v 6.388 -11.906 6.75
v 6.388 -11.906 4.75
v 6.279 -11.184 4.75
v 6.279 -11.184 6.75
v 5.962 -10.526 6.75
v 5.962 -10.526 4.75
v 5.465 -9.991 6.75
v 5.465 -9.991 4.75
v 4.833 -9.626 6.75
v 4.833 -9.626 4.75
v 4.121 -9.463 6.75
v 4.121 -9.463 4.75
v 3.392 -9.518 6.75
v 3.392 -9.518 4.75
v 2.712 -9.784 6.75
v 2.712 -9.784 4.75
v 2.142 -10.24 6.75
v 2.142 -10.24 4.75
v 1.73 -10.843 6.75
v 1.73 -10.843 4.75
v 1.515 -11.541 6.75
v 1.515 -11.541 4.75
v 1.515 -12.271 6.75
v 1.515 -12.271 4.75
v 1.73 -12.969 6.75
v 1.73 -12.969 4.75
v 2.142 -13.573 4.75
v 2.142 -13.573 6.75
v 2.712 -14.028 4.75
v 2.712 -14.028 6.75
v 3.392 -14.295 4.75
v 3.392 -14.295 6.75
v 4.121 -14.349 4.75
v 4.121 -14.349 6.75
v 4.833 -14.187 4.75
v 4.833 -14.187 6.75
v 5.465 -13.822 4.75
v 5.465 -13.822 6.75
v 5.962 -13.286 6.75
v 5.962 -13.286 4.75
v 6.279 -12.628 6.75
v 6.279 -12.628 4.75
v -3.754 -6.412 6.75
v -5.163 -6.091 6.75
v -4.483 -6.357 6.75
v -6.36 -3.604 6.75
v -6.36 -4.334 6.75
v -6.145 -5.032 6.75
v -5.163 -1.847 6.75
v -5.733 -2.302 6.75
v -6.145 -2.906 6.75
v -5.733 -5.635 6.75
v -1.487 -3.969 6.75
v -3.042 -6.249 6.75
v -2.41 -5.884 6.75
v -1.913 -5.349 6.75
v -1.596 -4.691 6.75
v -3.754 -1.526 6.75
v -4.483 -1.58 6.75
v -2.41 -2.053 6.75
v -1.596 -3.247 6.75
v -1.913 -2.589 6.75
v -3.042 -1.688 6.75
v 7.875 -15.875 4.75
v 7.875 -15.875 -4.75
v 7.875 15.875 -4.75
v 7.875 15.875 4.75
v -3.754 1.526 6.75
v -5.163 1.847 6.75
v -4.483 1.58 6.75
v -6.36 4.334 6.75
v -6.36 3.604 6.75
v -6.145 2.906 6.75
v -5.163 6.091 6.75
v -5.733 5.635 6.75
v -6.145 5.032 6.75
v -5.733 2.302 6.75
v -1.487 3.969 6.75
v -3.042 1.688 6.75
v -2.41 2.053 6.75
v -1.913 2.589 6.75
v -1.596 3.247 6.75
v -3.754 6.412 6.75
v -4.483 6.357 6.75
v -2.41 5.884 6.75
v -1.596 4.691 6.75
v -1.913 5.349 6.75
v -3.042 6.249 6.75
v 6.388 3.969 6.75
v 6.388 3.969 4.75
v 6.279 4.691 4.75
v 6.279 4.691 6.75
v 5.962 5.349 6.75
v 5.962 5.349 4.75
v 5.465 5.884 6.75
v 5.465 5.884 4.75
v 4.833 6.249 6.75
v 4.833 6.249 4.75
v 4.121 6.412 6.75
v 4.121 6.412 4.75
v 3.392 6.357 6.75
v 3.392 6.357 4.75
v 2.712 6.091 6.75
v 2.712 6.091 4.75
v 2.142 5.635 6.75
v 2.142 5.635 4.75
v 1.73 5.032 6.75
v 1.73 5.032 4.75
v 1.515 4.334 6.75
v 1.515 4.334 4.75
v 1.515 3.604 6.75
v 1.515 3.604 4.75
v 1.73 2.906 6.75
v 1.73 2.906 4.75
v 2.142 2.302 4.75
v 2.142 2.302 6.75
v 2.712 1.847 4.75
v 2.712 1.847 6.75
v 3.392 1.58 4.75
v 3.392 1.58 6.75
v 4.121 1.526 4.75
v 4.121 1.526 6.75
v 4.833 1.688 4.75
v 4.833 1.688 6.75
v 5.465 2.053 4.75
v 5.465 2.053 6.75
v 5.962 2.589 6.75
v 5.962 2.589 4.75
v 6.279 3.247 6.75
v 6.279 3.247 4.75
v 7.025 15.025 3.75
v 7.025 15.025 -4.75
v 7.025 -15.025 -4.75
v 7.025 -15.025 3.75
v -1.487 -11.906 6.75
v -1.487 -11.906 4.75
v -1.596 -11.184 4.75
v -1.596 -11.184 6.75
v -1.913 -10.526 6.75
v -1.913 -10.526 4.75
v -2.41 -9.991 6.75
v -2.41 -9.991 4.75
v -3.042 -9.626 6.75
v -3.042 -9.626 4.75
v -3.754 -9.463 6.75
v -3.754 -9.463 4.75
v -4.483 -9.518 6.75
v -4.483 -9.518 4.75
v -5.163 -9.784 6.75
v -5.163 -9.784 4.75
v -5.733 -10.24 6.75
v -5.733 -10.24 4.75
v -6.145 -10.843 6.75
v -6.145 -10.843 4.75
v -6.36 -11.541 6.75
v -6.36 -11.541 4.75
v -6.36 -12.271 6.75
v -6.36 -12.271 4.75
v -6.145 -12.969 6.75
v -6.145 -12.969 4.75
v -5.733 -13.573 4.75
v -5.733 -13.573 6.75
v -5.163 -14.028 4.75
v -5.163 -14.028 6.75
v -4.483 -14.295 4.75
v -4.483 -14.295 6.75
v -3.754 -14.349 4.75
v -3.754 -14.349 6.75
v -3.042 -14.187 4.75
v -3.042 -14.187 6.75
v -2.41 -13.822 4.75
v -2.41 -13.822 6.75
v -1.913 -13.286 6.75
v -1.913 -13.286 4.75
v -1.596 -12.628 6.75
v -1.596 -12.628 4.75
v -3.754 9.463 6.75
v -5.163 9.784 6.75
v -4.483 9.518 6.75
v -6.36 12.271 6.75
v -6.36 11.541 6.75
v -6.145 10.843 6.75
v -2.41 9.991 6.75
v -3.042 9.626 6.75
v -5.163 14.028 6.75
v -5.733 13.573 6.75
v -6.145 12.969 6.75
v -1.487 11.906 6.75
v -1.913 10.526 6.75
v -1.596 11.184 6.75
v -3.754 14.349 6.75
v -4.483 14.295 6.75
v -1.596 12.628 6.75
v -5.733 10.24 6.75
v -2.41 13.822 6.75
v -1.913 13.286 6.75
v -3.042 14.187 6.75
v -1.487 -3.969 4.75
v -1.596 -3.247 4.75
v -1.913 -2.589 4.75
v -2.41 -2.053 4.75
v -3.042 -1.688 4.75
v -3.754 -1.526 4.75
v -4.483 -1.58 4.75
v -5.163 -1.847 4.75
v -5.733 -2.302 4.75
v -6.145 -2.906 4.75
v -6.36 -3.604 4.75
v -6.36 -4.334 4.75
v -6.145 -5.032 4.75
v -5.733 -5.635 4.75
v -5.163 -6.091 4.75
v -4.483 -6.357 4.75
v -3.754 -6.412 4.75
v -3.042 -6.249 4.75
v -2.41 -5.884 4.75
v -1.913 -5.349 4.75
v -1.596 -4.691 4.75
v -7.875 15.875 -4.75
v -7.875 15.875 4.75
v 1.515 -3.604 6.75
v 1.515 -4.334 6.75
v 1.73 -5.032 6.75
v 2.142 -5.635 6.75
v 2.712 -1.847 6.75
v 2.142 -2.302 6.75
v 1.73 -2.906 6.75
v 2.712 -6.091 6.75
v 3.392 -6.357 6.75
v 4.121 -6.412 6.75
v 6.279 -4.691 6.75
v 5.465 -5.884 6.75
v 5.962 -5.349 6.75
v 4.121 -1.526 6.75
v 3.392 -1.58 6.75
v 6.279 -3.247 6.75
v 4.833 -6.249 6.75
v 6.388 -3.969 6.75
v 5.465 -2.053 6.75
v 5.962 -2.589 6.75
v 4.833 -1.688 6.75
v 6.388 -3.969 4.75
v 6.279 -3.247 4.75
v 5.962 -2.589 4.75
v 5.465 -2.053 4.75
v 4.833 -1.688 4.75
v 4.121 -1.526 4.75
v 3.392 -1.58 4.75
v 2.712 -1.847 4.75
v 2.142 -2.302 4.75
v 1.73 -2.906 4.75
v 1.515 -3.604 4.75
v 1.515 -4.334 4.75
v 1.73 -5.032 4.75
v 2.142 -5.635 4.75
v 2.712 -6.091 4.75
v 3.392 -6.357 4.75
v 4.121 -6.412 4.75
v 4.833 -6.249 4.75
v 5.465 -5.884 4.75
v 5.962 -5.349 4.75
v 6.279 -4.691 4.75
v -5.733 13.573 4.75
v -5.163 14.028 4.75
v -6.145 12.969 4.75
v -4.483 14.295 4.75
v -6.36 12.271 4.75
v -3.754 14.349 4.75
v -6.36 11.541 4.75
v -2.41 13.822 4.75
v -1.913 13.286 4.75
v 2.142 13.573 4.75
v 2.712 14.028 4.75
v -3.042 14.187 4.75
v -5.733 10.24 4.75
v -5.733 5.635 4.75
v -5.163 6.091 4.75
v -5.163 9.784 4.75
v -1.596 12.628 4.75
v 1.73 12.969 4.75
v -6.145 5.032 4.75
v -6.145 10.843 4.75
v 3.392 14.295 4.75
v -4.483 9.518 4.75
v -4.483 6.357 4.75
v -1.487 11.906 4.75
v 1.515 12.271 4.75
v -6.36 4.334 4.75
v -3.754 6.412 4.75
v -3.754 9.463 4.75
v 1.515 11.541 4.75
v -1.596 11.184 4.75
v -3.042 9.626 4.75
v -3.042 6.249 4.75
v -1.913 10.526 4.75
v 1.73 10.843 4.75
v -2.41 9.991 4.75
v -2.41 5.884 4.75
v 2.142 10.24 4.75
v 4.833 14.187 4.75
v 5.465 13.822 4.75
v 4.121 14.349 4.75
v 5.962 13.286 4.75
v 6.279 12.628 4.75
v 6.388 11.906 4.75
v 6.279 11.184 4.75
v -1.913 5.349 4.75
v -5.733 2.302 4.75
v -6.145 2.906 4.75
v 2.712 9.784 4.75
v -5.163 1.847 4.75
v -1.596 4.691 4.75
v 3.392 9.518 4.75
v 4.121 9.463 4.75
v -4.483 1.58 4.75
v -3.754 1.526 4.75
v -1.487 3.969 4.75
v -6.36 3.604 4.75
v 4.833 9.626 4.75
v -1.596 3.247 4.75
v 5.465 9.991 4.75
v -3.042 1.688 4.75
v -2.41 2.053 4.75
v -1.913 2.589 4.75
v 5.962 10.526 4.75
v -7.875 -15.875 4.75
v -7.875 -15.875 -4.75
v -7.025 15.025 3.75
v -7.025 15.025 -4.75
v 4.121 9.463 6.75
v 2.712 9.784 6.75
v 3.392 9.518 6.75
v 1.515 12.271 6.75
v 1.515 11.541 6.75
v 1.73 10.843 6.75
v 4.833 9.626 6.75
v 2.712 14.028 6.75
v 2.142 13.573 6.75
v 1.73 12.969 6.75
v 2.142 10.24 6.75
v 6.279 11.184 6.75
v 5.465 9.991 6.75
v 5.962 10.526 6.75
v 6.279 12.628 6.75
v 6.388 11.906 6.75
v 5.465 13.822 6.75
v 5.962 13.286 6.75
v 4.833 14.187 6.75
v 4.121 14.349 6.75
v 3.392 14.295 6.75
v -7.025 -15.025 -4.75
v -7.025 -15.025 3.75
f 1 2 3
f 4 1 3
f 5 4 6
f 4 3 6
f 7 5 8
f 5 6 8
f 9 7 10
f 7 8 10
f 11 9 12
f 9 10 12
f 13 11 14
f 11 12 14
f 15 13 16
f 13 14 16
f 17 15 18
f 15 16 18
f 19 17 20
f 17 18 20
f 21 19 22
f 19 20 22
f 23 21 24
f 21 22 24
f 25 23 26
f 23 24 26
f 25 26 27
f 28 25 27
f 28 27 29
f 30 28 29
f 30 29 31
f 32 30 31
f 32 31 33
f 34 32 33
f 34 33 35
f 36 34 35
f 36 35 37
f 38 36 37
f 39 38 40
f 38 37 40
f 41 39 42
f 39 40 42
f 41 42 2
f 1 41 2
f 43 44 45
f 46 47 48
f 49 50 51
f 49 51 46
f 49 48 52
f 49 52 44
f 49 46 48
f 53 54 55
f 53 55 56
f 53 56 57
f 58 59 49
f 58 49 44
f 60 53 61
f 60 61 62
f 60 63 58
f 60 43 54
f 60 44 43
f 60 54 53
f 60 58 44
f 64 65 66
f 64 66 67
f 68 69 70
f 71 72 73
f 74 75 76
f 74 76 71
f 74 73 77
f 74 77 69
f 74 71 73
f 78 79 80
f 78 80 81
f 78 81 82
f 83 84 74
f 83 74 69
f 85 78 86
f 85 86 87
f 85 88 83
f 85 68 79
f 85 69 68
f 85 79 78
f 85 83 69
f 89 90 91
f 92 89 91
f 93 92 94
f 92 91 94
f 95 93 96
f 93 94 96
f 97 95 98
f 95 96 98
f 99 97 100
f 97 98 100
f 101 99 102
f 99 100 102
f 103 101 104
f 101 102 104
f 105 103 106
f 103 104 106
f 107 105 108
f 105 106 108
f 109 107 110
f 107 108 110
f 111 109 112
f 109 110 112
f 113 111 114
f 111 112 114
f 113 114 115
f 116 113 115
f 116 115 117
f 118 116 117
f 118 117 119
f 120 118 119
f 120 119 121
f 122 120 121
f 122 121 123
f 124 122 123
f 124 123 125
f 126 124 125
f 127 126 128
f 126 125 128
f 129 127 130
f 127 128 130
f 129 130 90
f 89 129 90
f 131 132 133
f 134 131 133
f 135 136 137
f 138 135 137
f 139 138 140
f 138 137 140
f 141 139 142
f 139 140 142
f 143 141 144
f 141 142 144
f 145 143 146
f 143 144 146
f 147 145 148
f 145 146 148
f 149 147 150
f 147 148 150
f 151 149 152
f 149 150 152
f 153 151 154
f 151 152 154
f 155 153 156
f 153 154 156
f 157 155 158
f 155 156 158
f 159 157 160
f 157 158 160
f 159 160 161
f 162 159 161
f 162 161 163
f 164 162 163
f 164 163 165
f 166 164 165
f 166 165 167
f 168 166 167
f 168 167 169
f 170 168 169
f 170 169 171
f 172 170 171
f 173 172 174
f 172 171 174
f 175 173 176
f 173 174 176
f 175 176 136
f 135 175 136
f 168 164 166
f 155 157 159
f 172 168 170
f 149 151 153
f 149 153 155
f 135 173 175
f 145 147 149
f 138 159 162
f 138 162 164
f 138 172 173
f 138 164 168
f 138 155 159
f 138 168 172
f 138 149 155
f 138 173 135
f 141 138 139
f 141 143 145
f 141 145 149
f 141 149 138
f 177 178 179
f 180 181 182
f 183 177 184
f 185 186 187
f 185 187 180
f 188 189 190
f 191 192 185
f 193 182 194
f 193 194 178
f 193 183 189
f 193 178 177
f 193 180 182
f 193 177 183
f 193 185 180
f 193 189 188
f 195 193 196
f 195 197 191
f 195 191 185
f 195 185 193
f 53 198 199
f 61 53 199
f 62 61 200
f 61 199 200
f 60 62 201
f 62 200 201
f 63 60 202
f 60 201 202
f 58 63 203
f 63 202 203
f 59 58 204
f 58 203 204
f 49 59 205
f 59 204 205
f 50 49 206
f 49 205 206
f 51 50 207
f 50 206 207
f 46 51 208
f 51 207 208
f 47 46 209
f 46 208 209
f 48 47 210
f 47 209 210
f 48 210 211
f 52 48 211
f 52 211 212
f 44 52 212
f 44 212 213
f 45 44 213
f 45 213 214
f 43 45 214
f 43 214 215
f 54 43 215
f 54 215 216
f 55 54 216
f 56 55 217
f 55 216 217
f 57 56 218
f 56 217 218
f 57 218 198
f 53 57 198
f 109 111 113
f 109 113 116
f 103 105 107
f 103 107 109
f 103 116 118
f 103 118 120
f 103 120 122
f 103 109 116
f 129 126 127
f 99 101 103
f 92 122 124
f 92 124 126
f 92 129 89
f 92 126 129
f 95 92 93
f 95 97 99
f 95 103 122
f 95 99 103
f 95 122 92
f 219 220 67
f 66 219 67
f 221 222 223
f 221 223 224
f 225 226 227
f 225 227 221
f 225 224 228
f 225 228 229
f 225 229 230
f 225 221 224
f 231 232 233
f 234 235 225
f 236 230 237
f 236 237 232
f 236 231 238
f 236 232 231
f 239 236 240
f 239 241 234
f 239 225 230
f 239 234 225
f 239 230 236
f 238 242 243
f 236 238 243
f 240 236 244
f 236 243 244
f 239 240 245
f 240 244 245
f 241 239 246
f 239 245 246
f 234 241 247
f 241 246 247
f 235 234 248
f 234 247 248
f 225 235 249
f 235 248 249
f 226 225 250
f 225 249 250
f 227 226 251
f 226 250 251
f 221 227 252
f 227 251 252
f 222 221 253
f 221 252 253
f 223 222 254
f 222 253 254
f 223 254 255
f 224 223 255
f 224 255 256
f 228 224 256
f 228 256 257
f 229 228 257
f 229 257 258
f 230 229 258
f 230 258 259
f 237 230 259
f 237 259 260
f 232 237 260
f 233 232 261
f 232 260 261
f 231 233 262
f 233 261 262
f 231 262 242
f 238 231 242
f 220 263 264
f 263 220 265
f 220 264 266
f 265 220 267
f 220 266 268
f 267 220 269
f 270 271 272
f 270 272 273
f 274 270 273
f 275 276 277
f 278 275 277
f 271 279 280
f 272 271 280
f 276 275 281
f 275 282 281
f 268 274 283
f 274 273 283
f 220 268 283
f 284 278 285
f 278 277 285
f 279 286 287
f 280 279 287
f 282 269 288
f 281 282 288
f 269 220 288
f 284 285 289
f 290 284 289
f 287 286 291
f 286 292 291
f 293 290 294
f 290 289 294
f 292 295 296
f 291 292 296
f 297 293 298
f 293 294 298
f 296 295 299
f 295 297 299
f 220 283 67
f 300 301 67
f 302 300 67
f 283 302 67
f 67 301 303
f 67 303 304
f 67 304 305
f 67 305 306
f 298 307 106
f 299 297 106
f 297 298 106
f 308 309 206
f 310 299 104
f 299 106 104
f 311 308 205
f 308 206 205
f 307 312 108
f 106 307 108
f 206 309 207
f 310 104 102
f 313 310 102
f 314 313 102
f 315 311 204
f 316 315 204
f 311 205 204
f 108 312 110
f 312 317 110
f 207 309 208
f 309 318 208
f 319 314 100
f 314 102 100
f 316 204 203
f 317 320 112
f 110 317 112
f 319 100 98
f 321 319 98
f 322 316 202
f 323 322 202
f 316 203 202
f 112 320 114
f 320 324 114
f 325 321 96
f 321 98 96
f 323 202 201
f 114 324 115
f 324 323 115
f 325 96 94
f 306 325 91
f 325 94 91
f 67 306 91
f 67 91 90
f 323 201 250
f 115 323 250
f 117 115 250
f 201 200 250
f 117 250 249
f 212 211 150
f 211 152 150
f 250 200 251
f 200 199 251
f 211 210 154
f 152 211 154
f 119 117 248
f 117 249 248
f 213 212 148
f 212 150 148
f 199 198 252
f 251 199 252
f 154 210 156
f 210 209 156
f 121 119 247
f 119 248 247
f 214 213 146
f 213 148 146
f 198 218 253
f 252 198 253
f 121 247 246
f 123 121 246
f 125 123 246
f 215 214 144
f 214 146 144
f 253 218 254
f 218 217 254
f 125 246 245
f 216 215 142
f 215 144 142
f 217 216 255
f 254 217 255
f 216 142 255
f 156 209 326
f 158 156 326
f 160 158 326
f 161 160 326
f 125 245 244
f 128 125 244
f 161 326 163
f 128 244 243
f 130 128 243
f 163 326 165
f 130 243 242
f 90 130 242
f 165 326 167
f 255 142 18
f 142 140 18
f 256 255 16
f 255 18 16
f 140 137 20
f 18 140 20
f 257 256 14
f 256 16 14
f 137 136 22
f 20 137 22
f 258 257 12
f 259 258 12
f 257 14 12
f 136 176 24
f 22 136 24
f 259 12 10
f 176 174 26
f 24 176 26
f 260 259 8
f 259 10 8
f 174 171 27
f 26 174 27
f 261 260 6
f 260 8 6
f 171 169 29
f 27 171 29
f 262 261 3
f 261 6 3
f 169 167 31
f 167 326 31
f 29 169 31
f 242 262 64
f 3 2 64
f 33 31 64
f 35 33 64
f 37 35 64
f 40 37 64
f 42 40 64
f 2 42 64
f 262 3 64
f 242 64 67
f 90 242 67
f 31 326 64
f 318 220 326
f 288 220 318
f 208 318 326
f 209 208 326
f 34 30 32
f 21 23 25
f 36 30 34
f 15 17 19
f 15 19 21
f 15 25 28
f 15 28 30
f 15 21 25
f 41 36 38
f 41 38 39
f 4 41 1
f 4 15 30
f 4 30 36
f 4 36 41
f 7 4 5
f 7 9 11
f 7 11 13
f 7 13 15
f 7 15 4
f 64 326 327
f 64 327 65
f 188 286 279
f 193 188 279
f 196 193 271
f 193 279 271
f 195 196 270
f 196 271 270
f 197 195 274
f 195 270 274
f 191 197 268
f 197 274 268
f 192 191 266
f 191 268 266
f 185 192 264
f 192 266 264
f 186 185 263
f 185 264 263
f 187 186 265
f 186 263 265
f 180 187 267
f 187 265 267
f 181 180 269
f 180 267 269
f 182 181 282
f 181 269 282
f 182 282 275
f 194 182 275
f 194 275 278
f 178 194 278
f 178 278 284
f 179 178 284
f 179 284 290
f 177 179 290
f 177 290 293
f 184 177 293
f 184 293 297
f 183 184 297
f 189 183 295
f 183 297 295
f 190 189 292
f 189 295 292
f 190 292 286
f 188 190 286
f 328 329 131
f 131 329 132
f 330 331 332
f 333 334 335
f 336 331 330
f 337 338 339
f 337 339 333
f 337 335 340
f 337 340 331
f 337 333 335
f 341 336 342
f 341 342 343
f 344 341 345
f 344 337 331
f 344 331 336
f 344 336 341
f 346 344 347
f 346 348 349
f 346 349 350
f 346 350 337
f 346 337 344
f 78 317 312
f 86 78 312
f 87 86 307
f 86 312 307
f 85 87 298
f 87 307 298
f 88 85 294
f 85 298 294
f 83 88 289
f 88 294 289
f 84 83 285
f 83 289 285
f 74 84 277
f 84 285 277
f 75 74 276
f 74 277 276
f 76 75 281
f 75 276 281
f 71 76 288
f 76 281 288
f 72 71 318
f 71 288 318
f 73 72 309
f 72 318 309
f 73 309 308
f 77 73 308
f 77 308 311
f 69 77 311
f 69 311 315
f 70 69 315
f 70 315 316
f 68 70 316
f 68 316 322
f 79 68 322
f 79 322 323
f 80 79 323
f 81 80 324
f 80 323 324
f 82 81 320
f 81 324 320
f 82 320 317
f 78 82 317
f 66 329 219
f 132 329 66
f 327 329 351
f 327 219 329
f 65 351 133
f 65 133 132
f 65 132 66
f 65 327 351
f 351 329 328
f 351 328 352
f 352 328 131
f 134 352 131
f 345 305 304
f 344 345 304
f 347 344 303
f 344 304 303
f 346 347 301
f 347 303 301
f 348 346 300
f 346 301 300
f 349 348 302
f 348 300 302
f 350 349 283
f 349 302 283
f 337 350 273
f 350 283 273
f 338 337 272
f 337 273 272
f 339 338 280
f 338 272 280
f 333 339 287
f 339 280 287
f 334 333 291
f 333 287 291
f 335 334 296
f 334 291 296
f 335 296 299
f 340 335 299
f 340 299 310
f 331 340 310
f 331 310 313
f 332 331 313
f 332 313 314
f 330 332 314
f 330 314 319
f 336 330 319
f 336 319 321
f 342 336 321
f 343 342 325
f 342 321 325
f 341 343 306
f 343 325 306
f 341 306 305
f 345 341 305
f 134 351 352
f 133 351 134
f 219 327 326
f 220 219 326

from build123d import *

# Parameters (mm, degrees)
F0_W     = 15.75
F0_H     = 9.5
F1_DEPTH = 15.875
F2_R     = 2.45
F3_DEPTH = 2
F4_W     = 14.05
F4_H     = 30.05
F5_DEPTH = 8.5


with BuildPart() as f1:
    # F0 (on Front) → F1 (new body, symmetric)
    with BuildSketch(Plane.XZ):
        Rectangle(F0_W, F0_H)
    extrude(amount=F1_DEPTH, both=True)

    # F2 (on face) → F3 (join)
    with BuildSketch(Plane.XY.offset(4.75)):
        with Locations((-3.9375, 11.90625)):
            Circle(F2_R)
        with Locations((3.9375, 11.90625)):
            Circle(F2_R)
        with Locations((3.9375, 3.96875)):
            Circle(F2_R)
        with Locations((-3.9375, 3.96875)):
            Circle(F2_R)
        with Locations((-3.9375, -3.96875)):
            Circle(F2_R)
        with Locations((3.9375, -3.96875)):
            Circle(F2_R)
        with Locations((-3.9375, -11.90625)):
            Circle(F2_R)
        with Locations((3.9375, -11.90625)):
            Circle(F2_R)
    extrude(amount=F3_DEPTH)

    # F4 (on face) → F5 (cut)
    with BuildSketch(Plane(origin=(0, 0, -4.75), x_dir=(1, 0, 0), z_dir=(0, 0, -1))):
        Rectangle(F4_W, F4_H)
    extrude(amount=-F5_DEPTH, mode=Mode.SUBTRACT)


solid = f1.part
